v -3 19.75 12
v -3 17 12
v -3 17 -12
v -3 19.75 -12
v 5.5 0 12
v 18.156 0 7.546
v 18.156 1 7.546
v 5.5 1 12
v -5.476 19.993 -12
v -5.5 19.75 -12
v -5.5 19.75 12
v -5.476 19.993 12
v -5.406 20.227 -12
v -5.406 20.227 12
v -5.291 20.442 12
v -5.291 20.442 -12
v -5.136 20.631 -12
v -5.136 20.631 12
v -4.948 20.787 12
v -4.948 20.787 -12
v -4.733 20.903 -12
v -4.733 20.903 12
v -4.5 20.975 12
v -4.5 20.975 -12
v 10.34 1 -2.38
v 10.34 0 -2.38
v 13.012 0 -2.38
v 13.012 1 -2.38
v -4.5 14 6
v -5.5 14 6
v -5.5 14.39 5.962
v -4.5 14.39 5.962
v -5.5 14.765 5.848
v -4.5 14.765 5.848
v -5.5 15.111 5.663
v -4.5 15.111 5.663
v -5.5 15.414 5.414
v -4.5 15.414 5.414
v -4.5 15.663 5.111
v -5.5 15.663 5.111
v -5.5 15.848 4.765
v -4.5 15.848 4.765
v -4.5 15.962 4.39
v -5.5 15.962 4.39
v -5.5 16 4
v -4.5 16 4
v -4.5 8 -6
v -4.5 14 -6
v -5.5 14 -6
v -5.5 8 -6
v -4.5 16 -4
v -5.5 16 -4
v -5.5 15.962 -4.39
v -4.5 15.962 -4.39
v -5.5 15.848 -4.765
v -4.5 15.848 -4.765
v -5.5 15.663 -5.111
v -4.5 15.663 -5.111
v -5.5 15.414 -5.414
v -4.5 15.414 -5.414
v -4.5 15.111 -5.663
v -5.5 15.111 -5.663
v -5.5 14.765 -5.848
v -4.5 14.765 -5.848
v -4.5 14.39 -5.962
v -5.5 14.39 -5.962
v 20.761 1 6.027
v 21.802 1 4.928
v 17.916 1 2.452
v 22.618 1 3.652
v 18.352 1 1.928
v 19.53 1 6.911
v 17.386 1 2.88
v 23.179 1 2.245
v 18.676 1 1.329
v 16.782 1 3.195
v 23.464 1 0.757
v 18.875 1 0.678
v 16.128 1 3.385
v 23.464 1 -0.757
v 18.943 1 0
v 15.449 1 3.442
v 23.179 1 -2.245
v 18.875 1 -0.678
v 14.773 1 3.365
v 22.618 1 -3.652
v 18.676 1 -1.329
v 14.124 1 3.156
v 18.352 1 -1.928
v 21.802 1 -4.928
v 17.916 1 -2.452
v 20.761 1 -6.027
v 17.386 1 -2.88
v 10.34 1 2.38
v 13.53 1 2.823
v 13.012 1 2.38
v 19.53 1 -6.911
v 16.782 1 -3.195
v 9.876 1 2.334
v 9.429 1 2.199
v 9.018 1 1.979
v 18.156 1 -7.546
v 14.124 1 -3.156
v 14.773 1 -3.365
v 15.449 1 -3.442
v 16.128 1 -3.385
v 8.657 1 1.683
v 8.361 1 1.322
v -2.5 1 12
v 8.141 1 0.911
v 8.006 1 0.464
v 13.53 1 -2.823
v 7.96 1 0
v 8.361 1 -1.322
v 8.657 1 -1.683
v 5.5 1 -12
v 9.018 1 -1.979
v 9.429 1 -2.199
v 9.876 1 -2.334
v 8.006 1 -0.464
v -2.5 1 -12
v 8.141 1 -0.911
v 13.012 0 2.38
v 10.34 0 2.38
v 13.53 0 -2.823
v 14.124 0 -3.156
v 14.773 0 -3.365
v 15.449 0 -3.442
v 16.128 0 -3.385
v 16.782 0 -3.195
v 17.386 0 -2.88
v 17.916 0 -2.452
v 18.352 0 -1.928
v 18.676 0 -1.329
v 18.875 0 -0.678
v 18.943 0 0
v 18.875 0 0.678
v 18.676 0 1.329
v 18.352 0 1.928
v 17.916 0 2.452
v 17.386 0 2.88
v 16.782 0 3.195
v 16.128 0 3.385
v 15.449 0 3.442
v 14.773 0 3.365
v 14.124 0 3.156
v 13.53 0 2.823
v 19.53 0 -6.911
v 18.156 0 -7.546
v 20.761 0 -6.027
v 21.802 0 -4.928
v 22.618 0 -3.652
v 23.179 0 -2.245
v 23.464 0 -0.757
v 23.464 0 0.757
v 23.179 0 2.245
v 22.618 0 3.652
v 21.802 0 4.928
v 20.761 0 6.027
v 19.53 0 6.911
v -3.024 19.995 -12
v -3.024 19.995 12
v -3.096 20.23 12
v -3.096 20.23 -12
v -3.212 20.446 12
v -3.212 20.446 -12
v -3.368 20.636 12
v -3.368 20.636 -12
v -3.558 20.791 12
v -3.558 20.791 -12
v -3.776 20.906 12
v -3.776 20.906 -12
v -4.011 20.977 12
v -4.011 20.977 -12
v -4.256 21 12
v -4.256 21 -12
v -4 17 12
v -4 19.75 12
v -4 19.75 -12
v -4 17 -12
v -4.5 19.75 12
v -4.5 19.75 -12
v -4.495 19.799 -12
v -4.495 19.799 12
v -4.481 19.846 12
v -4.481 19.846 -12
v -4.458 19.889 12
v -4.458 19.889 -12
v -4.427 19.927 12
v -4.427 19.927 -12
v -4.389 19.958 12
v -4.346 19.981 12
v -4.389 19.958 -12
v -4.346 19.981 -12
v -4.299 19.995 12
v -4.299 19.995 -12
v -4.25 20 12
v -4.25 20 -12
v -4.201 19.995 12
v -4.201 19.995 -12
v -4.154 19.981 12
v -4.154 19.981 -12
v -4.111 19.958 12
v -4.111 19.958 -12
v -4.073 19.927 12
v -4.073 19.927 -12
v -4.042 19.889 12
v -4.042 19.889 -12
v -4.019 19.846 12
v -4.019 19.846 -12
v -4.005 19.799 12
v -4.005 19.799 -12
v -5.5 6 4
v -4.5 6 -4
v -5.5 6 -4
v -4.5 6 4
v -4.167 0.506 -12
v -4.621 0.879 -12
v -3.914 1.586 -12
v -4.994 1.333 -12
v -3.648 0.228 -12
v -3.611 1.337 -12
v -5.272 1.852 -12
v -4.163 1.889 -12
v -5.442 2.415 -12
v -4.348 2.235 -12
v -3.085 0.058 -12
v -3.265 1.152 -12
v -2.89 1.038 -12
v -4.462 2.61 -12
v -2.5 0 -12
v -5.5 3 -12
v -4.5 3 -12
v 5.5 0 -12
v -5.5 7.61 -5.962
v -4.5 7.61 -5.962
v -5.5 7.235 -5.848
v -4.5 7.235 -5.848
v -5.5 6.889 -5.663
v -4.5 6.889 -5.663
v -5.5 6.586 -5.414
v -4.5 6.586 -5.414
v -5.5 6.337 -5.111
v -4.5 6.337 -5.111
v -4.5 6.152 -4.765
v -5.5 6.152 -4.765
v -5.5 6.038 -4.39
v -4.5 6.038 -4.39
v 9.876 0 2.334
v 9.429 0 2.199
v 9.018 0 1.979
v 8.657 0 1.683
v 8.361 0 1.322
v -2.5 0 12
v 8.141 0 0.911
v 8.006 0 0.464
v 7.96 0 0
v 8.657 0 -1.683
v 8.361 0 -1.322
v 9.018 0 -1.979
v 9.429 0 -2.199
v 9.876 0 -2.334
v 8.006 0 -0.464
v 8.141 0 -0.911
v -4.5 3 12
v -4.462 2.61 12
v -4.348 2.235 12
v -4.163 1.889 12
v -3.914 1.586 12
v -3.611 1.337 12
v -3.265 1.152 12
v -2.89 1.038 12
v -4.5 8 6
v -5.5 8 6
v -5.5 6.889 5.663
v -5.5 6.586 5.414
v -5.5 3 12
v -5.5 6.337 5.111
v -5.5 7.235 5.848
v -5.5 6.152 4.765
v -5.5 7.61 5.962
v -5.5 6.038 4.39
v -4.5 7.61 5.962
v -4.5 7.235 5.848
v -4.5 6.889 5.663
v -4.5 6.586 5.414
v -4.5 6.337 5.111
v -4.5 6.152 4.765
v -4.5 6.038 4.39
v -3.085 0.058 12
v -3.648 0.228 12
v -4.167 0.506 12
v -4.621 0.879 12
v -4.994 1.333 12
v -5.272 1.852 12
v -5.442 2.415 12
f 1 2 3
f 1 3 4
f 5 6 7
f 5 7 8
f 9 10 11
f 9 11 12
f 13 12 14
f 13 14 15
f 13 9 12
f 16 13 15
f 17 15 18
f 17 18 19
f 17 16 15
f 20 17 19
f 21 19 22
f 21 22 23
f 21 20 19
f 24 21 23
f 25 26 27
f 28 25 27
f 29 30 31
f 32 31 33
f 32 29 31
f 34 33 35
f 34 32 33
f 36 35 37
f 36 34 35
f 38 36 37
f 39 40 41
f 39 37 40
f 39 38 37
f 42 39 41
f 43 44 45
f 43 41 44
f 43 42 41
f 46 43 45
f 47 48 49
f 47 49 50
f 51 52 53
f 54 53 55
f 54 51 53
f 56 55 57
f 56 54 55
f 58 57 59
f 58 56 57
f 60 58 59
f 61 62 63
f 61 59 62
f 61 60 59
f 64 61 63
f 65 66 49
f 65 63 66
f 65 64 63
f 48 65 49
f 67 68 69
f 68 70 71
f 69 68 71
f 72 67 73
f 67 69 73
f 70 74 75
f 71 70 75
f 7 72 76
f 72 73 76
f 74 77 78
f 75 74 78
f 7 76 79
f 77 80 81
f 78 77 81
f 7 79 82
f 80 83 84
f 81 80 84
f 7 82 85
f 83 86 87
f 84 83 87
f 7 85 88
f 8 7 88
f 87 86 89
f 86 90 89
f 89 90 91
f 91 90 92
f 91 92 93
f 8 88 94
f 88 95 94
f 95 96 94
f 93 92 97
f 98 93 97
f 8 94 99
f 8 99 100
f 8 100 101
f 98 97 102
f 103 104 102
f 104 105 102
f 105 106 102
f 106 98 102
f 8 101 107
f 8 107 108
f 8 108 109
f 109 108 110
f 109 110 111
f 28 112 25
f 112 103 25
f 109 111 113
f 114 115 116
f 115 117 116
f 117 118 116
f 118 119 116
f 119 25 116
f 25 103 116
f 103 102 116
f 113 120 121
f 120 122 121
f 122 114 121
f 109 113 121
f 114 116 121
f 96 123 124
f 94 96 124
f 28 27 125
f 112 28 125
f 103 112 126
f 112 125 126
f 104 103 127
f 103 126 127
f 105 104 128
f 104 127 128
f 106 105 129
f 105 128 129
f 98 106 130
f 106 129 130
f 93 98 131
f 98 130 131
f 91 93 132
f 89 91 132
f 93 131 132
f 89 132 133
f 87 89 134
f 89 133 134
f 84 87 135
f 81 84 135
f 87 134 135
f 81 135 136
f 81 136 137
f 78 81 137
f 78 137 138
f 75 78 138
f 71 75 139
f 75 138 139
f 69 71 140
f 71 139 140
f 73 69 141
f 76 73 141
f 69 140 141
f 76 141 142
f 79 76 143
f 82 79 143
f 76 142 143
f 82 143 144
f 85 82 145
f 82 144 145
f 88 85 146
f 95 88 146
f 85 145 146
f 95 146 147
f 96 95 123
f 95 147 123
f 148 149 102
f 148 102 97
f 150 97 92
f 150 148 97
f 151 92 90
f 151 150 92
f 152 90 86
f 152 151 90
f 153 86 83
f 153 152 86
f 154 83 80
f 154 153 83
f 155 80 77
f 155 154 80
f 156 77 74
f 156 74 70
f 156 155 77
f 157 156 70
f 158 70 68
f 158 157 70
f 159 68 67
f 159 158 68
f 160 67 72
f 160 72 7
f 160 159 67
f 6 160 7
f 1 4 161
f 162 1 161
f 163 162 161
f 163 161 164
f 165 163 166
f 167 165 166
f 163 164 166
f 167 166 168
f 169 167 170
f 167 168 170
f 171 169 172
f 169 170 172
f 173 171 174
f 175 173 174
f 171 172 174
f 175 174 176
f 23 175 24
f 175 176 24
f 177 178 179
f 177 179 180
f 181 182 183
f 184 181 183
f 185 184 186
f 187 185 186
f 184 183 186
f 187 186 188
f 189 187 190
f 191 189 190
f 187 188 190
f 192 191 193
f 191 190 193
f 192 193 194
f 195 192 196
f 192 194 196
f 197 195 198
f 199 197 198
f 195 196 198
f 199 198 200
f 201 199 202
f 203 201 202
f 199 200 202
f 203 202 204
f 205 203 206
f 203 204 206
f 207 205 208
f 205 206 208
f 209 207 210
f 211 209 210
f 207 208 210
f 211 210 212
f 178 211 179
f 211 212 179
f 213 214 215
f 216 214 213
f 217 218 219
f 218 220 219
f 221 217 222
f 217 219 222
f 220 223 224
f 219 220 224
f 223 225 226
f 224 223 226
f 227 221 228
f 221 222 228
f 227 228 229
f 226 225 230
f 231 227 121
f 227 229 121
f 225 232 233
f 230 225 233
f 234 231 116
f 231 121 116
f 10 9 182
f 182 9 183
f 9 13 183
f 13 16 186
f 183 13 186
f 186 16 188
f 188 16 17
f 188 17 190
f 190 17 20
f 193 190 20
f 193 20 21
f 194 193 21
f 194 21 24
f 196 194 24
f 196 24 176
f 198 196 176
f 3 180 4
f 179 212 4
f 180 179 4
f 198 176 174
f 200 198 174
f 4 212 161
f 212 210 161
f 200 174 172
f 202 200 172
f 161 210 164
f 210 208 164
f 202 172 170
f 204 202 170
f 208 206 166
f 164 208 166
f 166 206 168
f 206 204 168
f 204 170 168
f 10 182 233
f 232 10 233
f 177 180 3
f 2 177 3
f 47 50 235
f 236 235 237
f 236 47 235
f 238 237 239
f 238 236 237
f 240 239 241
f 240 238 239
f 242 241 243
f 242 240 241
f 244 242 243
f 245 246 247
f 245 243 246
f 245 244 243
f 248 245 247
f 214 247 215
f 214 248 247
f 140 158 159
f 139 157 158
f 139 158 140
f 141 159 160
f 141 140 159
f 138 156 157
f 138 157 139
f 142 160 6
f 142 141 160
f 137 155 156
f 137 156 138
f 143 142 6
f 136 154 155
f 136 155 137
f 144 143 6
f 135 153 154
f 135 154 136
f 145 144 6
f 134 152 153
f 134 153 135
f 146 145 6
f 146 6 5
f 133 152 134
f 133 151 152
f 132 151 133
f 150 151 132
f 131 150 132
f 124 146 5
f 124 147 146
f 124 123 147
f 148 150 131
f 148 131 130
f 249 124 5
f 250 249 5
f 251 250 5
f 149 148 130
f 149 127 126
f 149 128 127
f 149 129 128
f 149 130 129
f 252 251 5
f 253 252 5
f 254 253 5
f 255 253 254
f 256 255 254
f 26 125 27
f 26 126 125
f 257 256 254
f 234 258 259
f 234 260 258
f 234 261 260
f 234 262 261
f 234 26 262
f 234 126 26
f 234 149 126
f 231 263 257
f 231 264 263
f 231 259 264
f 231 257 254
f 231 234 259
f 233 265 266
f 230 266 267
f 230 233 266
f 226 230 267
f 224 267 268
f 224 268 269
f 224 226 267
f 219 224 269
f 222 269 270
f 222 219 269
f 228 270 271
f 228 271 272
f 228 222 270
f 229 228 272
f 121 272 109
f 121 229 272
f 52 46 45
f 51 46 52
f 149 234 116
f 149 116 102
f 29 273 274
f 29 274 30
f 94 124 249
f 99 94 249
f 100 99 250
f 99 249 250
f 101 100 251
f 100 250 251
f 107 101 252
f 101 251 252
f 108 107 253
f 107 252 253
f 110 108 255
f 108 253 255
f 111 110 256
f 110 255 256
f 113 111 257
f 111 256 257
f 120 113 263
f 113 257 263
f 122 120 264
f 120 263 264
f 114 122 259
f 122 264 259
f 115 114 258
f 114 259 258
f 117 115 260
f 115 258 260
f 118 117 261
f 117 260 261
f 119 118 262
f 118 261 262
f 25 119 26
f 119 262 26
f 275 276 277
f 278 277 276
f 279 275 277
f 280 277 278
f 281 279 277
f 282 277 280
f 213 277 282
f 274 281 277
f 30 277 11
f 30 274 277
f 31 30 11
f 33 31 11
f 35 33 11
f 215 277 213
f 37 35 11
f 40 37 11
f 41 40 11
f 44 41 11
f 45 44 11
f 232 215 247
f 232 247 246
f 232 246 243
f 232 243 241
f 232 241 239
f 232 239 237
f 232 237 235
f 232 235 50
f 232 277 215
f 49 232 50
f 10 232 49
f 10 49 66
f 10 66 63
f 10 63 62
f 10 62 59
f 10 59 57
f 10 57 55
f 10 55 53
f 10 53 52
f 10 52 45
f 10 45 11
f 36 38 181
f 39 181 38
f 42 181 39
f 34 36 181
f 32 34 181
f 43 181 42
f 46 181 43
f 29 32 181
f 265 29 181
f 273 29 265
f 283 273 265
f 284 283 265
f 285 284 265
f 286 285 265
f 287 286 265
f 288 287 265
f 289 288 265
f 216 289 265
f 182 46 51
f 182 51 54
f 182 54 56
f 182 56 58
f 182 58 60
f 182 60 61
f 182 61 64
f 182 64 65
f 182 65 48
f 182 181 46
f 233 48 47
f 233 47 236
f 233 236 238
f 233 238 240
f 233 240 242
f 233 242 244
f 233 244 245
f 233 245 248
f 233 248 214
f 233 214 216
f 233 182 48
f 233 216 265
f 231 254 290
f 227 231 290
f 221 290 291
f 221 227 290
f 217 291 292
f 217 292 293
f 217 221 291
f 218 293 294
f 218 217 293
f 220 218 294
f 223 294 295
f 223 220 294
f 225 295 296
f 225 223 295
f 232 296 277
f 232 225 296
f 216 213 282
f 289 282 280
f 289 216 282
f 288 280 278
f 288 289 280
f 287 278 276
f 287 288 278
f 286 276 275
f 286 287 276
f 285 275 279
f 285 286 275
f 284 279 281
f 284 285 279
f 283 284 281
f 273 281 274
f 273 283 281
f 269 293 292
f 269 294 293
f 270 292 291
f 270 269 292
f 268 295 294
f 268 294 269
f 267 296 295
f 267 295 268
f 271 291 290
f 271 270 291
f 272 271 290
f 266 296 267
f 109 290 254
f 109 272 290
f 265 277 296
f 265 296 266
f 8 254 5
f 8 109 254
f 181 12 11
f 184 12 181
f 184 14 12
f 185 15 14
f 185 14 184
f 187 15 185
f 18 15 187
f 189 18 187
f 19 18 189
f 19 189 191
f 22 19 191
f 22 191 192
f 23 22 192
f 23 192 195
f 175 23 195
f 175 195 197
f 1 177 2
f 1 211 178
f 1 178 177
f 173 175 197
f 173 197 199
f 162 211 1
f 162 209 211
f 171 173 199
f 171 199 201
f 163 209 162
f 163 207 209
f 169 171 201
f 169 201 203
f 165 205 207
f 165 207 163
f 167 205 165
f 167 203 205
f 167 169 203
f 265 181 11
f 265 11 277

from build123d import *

# Parameters (mm, degrees)
BASE_FLANGE1_DEPTH           = 1
EDGE_FLANGE1_STRIP_W         = 8
EDGE_FLANGE1_STRIP_H         = 1
EDGE_FLANGE1_STRIP_CUT_DEPTH = 24
EDGE_FLANGE1_DEPTH           = 24
HEM1_START                   = -12
HEM1_DEPTH                   = 24
HEM1_2_DEPTH                 = 24
CUT_EXTRUDE1_DEPTH           = 10


# Read off the part's stored shape, not the designer's step: Hem1
# Sheet-metal steps are written as plain solids
with BuildPart() as part:
    # Sketch1 → Base-Flange1 (new body)
    with BuildSketch(Plane(origin=(0, 0, 0), x_dir=(1, 0, 0), z_dir=(0, 1, 0))):
        with BuildLine():
            Line((-5.5, 12), (5.5, 12))
            Line((5.5, 12), (18.155635881, 7.546363234))
            ThreePointArc((18.155635881, 7.546363234), (23.5, 0), (18.155635881, -7.546363234))
            Line((18.155635881, -7.546363234), (5.5, -12))
            Line((5.5, -12), (-5.5, -12))
            Line((-5.5, -12), (-5.5, 12))
        make_face()
        with BuildLine():
            Line((10.34, 2.38), (13.012470906, 2.38))
            ThreePointArc((13.012470906, 2.38), (18.942702571, 0), (13.012470906, -2.38))
            Line((13.012470906, -2.38), (10.34, -2.38))
            ThreePointArc((10.34, -2.38), (7.96, 0), (10.34, 2.38))
        make_face(mode=Mode.SUBTRACT)
    extrude(amount=BASE_FLANGE1_DEPTH)

    # Edge-Flange1 strip (across the edge) → Edge-Flange1 strip cut (cut)
    with BuildSketch(Plane(origin=(-5.5, 1, -12), x_dir=(1, 0, 0), z_dir=(0, 0, 1))):
        with Locations((-1, -0.5)):
            Rectangle(EDGE_FLANGE1_STRIP_W, EDGE_FLANGE1_STRIP_H)
    extrude(amount=EDGE_FLANGE1_STRIP_CUT_DEPTH, mode=Mode.SUBTRACT)

    # Edge-Flange1 section (across the edge) → Edge-Flange1 (add)
    with BuildSketch(Plane(origin=(-5.5, 1, -12), x_dir=(1, 0, 0), z_dir=(0, 0, 1))):
        with BuildLine():
            Line((0, 2), (0, 20))
            Line((0, 20), (1, 20))
            Line((1, 20), (1, 2))
            ThreePointArc((1, 2), (1.585786438, 0.585786438), (3, 0))
            Line((3, 0), (3, -1))
            ThreePointArc((3, -1), (0.878679656, -0.121320344), (0, 2))
        make_face()
    extrude(amount=EDGE_FLANGE1_DEPTH)

    # Hem1 outline → Hem1 (cut)
    with BuildSketch(Plane.XY.offset(HEM1_START)):
        with BuildLine():
            ThreePointArc((-5.5, 19.75), (-5.218245837, 20.540569415), (-4.5, 20.974744871))
            Line((-4.5, 20.974744871), (-4.5, 21))
            Line((-4.5, 21), (-5.5, 21))
            Line((-5.5, 21), (-5.5, 19.75))
        make_face()
    extrude(amount=HEM1_DEPTH, mode=Mode.SUBTRACT)

    # Hem1 2 outline → Hem1 2 (add)
    with BuildSketch(Plane.XY.offset(HEM1_START)):
        with BuildLine():
            Line((-4, 17), (-3, 17))
            Line((-3, 17), (-3, 19.75))
            ThreePointArc((-3, 19.75), (-3.459430585, 20.718245837), (-4.5, 20.974744871))
            Line((-4.5, 20.974744871), (-4.5, 19.75))
            ThreePointArc((-4.5, 19.75), (-4.25, 20), (-4, 19.75))
            Line((-4, 19.75), (-4, 17))
        make_face()
    extrude(amount=HEM1_2_DEPTH)

    # Sketch11 → Cut-Extrude1 (cut)
    with BuildSketch(Plane(origin=(-4.5, 0, 0), x_dir=(0, 0, -1), z_dir=(1, 0, 0))):
        with BuildLine():
            Line((-4, 16), (4, 16))
            ThreePointArc((4, 16), (5.414213562, 15.414213562), (6, 14))
            Line((6, 14), (6, 8))
            ThreePointArc((6, 8), (5.414213562, 6.585786438), (4, 6))
            Line((4, 6), (-4, 6))
            ThreePointArc((-4, 6), (-5.414213562, 6.585786438), (-6, 8))
            Line((-6, 8), (-6, 14))
            ThreePointArc((-6, 14), (-5.414213562, 15.414213562), (-4, 16))
        make_face()
    extrude(amount=-CUT_EXTRUDE1_DEPTH, mode=Mode.SUBTRACT)


solid = part.part
